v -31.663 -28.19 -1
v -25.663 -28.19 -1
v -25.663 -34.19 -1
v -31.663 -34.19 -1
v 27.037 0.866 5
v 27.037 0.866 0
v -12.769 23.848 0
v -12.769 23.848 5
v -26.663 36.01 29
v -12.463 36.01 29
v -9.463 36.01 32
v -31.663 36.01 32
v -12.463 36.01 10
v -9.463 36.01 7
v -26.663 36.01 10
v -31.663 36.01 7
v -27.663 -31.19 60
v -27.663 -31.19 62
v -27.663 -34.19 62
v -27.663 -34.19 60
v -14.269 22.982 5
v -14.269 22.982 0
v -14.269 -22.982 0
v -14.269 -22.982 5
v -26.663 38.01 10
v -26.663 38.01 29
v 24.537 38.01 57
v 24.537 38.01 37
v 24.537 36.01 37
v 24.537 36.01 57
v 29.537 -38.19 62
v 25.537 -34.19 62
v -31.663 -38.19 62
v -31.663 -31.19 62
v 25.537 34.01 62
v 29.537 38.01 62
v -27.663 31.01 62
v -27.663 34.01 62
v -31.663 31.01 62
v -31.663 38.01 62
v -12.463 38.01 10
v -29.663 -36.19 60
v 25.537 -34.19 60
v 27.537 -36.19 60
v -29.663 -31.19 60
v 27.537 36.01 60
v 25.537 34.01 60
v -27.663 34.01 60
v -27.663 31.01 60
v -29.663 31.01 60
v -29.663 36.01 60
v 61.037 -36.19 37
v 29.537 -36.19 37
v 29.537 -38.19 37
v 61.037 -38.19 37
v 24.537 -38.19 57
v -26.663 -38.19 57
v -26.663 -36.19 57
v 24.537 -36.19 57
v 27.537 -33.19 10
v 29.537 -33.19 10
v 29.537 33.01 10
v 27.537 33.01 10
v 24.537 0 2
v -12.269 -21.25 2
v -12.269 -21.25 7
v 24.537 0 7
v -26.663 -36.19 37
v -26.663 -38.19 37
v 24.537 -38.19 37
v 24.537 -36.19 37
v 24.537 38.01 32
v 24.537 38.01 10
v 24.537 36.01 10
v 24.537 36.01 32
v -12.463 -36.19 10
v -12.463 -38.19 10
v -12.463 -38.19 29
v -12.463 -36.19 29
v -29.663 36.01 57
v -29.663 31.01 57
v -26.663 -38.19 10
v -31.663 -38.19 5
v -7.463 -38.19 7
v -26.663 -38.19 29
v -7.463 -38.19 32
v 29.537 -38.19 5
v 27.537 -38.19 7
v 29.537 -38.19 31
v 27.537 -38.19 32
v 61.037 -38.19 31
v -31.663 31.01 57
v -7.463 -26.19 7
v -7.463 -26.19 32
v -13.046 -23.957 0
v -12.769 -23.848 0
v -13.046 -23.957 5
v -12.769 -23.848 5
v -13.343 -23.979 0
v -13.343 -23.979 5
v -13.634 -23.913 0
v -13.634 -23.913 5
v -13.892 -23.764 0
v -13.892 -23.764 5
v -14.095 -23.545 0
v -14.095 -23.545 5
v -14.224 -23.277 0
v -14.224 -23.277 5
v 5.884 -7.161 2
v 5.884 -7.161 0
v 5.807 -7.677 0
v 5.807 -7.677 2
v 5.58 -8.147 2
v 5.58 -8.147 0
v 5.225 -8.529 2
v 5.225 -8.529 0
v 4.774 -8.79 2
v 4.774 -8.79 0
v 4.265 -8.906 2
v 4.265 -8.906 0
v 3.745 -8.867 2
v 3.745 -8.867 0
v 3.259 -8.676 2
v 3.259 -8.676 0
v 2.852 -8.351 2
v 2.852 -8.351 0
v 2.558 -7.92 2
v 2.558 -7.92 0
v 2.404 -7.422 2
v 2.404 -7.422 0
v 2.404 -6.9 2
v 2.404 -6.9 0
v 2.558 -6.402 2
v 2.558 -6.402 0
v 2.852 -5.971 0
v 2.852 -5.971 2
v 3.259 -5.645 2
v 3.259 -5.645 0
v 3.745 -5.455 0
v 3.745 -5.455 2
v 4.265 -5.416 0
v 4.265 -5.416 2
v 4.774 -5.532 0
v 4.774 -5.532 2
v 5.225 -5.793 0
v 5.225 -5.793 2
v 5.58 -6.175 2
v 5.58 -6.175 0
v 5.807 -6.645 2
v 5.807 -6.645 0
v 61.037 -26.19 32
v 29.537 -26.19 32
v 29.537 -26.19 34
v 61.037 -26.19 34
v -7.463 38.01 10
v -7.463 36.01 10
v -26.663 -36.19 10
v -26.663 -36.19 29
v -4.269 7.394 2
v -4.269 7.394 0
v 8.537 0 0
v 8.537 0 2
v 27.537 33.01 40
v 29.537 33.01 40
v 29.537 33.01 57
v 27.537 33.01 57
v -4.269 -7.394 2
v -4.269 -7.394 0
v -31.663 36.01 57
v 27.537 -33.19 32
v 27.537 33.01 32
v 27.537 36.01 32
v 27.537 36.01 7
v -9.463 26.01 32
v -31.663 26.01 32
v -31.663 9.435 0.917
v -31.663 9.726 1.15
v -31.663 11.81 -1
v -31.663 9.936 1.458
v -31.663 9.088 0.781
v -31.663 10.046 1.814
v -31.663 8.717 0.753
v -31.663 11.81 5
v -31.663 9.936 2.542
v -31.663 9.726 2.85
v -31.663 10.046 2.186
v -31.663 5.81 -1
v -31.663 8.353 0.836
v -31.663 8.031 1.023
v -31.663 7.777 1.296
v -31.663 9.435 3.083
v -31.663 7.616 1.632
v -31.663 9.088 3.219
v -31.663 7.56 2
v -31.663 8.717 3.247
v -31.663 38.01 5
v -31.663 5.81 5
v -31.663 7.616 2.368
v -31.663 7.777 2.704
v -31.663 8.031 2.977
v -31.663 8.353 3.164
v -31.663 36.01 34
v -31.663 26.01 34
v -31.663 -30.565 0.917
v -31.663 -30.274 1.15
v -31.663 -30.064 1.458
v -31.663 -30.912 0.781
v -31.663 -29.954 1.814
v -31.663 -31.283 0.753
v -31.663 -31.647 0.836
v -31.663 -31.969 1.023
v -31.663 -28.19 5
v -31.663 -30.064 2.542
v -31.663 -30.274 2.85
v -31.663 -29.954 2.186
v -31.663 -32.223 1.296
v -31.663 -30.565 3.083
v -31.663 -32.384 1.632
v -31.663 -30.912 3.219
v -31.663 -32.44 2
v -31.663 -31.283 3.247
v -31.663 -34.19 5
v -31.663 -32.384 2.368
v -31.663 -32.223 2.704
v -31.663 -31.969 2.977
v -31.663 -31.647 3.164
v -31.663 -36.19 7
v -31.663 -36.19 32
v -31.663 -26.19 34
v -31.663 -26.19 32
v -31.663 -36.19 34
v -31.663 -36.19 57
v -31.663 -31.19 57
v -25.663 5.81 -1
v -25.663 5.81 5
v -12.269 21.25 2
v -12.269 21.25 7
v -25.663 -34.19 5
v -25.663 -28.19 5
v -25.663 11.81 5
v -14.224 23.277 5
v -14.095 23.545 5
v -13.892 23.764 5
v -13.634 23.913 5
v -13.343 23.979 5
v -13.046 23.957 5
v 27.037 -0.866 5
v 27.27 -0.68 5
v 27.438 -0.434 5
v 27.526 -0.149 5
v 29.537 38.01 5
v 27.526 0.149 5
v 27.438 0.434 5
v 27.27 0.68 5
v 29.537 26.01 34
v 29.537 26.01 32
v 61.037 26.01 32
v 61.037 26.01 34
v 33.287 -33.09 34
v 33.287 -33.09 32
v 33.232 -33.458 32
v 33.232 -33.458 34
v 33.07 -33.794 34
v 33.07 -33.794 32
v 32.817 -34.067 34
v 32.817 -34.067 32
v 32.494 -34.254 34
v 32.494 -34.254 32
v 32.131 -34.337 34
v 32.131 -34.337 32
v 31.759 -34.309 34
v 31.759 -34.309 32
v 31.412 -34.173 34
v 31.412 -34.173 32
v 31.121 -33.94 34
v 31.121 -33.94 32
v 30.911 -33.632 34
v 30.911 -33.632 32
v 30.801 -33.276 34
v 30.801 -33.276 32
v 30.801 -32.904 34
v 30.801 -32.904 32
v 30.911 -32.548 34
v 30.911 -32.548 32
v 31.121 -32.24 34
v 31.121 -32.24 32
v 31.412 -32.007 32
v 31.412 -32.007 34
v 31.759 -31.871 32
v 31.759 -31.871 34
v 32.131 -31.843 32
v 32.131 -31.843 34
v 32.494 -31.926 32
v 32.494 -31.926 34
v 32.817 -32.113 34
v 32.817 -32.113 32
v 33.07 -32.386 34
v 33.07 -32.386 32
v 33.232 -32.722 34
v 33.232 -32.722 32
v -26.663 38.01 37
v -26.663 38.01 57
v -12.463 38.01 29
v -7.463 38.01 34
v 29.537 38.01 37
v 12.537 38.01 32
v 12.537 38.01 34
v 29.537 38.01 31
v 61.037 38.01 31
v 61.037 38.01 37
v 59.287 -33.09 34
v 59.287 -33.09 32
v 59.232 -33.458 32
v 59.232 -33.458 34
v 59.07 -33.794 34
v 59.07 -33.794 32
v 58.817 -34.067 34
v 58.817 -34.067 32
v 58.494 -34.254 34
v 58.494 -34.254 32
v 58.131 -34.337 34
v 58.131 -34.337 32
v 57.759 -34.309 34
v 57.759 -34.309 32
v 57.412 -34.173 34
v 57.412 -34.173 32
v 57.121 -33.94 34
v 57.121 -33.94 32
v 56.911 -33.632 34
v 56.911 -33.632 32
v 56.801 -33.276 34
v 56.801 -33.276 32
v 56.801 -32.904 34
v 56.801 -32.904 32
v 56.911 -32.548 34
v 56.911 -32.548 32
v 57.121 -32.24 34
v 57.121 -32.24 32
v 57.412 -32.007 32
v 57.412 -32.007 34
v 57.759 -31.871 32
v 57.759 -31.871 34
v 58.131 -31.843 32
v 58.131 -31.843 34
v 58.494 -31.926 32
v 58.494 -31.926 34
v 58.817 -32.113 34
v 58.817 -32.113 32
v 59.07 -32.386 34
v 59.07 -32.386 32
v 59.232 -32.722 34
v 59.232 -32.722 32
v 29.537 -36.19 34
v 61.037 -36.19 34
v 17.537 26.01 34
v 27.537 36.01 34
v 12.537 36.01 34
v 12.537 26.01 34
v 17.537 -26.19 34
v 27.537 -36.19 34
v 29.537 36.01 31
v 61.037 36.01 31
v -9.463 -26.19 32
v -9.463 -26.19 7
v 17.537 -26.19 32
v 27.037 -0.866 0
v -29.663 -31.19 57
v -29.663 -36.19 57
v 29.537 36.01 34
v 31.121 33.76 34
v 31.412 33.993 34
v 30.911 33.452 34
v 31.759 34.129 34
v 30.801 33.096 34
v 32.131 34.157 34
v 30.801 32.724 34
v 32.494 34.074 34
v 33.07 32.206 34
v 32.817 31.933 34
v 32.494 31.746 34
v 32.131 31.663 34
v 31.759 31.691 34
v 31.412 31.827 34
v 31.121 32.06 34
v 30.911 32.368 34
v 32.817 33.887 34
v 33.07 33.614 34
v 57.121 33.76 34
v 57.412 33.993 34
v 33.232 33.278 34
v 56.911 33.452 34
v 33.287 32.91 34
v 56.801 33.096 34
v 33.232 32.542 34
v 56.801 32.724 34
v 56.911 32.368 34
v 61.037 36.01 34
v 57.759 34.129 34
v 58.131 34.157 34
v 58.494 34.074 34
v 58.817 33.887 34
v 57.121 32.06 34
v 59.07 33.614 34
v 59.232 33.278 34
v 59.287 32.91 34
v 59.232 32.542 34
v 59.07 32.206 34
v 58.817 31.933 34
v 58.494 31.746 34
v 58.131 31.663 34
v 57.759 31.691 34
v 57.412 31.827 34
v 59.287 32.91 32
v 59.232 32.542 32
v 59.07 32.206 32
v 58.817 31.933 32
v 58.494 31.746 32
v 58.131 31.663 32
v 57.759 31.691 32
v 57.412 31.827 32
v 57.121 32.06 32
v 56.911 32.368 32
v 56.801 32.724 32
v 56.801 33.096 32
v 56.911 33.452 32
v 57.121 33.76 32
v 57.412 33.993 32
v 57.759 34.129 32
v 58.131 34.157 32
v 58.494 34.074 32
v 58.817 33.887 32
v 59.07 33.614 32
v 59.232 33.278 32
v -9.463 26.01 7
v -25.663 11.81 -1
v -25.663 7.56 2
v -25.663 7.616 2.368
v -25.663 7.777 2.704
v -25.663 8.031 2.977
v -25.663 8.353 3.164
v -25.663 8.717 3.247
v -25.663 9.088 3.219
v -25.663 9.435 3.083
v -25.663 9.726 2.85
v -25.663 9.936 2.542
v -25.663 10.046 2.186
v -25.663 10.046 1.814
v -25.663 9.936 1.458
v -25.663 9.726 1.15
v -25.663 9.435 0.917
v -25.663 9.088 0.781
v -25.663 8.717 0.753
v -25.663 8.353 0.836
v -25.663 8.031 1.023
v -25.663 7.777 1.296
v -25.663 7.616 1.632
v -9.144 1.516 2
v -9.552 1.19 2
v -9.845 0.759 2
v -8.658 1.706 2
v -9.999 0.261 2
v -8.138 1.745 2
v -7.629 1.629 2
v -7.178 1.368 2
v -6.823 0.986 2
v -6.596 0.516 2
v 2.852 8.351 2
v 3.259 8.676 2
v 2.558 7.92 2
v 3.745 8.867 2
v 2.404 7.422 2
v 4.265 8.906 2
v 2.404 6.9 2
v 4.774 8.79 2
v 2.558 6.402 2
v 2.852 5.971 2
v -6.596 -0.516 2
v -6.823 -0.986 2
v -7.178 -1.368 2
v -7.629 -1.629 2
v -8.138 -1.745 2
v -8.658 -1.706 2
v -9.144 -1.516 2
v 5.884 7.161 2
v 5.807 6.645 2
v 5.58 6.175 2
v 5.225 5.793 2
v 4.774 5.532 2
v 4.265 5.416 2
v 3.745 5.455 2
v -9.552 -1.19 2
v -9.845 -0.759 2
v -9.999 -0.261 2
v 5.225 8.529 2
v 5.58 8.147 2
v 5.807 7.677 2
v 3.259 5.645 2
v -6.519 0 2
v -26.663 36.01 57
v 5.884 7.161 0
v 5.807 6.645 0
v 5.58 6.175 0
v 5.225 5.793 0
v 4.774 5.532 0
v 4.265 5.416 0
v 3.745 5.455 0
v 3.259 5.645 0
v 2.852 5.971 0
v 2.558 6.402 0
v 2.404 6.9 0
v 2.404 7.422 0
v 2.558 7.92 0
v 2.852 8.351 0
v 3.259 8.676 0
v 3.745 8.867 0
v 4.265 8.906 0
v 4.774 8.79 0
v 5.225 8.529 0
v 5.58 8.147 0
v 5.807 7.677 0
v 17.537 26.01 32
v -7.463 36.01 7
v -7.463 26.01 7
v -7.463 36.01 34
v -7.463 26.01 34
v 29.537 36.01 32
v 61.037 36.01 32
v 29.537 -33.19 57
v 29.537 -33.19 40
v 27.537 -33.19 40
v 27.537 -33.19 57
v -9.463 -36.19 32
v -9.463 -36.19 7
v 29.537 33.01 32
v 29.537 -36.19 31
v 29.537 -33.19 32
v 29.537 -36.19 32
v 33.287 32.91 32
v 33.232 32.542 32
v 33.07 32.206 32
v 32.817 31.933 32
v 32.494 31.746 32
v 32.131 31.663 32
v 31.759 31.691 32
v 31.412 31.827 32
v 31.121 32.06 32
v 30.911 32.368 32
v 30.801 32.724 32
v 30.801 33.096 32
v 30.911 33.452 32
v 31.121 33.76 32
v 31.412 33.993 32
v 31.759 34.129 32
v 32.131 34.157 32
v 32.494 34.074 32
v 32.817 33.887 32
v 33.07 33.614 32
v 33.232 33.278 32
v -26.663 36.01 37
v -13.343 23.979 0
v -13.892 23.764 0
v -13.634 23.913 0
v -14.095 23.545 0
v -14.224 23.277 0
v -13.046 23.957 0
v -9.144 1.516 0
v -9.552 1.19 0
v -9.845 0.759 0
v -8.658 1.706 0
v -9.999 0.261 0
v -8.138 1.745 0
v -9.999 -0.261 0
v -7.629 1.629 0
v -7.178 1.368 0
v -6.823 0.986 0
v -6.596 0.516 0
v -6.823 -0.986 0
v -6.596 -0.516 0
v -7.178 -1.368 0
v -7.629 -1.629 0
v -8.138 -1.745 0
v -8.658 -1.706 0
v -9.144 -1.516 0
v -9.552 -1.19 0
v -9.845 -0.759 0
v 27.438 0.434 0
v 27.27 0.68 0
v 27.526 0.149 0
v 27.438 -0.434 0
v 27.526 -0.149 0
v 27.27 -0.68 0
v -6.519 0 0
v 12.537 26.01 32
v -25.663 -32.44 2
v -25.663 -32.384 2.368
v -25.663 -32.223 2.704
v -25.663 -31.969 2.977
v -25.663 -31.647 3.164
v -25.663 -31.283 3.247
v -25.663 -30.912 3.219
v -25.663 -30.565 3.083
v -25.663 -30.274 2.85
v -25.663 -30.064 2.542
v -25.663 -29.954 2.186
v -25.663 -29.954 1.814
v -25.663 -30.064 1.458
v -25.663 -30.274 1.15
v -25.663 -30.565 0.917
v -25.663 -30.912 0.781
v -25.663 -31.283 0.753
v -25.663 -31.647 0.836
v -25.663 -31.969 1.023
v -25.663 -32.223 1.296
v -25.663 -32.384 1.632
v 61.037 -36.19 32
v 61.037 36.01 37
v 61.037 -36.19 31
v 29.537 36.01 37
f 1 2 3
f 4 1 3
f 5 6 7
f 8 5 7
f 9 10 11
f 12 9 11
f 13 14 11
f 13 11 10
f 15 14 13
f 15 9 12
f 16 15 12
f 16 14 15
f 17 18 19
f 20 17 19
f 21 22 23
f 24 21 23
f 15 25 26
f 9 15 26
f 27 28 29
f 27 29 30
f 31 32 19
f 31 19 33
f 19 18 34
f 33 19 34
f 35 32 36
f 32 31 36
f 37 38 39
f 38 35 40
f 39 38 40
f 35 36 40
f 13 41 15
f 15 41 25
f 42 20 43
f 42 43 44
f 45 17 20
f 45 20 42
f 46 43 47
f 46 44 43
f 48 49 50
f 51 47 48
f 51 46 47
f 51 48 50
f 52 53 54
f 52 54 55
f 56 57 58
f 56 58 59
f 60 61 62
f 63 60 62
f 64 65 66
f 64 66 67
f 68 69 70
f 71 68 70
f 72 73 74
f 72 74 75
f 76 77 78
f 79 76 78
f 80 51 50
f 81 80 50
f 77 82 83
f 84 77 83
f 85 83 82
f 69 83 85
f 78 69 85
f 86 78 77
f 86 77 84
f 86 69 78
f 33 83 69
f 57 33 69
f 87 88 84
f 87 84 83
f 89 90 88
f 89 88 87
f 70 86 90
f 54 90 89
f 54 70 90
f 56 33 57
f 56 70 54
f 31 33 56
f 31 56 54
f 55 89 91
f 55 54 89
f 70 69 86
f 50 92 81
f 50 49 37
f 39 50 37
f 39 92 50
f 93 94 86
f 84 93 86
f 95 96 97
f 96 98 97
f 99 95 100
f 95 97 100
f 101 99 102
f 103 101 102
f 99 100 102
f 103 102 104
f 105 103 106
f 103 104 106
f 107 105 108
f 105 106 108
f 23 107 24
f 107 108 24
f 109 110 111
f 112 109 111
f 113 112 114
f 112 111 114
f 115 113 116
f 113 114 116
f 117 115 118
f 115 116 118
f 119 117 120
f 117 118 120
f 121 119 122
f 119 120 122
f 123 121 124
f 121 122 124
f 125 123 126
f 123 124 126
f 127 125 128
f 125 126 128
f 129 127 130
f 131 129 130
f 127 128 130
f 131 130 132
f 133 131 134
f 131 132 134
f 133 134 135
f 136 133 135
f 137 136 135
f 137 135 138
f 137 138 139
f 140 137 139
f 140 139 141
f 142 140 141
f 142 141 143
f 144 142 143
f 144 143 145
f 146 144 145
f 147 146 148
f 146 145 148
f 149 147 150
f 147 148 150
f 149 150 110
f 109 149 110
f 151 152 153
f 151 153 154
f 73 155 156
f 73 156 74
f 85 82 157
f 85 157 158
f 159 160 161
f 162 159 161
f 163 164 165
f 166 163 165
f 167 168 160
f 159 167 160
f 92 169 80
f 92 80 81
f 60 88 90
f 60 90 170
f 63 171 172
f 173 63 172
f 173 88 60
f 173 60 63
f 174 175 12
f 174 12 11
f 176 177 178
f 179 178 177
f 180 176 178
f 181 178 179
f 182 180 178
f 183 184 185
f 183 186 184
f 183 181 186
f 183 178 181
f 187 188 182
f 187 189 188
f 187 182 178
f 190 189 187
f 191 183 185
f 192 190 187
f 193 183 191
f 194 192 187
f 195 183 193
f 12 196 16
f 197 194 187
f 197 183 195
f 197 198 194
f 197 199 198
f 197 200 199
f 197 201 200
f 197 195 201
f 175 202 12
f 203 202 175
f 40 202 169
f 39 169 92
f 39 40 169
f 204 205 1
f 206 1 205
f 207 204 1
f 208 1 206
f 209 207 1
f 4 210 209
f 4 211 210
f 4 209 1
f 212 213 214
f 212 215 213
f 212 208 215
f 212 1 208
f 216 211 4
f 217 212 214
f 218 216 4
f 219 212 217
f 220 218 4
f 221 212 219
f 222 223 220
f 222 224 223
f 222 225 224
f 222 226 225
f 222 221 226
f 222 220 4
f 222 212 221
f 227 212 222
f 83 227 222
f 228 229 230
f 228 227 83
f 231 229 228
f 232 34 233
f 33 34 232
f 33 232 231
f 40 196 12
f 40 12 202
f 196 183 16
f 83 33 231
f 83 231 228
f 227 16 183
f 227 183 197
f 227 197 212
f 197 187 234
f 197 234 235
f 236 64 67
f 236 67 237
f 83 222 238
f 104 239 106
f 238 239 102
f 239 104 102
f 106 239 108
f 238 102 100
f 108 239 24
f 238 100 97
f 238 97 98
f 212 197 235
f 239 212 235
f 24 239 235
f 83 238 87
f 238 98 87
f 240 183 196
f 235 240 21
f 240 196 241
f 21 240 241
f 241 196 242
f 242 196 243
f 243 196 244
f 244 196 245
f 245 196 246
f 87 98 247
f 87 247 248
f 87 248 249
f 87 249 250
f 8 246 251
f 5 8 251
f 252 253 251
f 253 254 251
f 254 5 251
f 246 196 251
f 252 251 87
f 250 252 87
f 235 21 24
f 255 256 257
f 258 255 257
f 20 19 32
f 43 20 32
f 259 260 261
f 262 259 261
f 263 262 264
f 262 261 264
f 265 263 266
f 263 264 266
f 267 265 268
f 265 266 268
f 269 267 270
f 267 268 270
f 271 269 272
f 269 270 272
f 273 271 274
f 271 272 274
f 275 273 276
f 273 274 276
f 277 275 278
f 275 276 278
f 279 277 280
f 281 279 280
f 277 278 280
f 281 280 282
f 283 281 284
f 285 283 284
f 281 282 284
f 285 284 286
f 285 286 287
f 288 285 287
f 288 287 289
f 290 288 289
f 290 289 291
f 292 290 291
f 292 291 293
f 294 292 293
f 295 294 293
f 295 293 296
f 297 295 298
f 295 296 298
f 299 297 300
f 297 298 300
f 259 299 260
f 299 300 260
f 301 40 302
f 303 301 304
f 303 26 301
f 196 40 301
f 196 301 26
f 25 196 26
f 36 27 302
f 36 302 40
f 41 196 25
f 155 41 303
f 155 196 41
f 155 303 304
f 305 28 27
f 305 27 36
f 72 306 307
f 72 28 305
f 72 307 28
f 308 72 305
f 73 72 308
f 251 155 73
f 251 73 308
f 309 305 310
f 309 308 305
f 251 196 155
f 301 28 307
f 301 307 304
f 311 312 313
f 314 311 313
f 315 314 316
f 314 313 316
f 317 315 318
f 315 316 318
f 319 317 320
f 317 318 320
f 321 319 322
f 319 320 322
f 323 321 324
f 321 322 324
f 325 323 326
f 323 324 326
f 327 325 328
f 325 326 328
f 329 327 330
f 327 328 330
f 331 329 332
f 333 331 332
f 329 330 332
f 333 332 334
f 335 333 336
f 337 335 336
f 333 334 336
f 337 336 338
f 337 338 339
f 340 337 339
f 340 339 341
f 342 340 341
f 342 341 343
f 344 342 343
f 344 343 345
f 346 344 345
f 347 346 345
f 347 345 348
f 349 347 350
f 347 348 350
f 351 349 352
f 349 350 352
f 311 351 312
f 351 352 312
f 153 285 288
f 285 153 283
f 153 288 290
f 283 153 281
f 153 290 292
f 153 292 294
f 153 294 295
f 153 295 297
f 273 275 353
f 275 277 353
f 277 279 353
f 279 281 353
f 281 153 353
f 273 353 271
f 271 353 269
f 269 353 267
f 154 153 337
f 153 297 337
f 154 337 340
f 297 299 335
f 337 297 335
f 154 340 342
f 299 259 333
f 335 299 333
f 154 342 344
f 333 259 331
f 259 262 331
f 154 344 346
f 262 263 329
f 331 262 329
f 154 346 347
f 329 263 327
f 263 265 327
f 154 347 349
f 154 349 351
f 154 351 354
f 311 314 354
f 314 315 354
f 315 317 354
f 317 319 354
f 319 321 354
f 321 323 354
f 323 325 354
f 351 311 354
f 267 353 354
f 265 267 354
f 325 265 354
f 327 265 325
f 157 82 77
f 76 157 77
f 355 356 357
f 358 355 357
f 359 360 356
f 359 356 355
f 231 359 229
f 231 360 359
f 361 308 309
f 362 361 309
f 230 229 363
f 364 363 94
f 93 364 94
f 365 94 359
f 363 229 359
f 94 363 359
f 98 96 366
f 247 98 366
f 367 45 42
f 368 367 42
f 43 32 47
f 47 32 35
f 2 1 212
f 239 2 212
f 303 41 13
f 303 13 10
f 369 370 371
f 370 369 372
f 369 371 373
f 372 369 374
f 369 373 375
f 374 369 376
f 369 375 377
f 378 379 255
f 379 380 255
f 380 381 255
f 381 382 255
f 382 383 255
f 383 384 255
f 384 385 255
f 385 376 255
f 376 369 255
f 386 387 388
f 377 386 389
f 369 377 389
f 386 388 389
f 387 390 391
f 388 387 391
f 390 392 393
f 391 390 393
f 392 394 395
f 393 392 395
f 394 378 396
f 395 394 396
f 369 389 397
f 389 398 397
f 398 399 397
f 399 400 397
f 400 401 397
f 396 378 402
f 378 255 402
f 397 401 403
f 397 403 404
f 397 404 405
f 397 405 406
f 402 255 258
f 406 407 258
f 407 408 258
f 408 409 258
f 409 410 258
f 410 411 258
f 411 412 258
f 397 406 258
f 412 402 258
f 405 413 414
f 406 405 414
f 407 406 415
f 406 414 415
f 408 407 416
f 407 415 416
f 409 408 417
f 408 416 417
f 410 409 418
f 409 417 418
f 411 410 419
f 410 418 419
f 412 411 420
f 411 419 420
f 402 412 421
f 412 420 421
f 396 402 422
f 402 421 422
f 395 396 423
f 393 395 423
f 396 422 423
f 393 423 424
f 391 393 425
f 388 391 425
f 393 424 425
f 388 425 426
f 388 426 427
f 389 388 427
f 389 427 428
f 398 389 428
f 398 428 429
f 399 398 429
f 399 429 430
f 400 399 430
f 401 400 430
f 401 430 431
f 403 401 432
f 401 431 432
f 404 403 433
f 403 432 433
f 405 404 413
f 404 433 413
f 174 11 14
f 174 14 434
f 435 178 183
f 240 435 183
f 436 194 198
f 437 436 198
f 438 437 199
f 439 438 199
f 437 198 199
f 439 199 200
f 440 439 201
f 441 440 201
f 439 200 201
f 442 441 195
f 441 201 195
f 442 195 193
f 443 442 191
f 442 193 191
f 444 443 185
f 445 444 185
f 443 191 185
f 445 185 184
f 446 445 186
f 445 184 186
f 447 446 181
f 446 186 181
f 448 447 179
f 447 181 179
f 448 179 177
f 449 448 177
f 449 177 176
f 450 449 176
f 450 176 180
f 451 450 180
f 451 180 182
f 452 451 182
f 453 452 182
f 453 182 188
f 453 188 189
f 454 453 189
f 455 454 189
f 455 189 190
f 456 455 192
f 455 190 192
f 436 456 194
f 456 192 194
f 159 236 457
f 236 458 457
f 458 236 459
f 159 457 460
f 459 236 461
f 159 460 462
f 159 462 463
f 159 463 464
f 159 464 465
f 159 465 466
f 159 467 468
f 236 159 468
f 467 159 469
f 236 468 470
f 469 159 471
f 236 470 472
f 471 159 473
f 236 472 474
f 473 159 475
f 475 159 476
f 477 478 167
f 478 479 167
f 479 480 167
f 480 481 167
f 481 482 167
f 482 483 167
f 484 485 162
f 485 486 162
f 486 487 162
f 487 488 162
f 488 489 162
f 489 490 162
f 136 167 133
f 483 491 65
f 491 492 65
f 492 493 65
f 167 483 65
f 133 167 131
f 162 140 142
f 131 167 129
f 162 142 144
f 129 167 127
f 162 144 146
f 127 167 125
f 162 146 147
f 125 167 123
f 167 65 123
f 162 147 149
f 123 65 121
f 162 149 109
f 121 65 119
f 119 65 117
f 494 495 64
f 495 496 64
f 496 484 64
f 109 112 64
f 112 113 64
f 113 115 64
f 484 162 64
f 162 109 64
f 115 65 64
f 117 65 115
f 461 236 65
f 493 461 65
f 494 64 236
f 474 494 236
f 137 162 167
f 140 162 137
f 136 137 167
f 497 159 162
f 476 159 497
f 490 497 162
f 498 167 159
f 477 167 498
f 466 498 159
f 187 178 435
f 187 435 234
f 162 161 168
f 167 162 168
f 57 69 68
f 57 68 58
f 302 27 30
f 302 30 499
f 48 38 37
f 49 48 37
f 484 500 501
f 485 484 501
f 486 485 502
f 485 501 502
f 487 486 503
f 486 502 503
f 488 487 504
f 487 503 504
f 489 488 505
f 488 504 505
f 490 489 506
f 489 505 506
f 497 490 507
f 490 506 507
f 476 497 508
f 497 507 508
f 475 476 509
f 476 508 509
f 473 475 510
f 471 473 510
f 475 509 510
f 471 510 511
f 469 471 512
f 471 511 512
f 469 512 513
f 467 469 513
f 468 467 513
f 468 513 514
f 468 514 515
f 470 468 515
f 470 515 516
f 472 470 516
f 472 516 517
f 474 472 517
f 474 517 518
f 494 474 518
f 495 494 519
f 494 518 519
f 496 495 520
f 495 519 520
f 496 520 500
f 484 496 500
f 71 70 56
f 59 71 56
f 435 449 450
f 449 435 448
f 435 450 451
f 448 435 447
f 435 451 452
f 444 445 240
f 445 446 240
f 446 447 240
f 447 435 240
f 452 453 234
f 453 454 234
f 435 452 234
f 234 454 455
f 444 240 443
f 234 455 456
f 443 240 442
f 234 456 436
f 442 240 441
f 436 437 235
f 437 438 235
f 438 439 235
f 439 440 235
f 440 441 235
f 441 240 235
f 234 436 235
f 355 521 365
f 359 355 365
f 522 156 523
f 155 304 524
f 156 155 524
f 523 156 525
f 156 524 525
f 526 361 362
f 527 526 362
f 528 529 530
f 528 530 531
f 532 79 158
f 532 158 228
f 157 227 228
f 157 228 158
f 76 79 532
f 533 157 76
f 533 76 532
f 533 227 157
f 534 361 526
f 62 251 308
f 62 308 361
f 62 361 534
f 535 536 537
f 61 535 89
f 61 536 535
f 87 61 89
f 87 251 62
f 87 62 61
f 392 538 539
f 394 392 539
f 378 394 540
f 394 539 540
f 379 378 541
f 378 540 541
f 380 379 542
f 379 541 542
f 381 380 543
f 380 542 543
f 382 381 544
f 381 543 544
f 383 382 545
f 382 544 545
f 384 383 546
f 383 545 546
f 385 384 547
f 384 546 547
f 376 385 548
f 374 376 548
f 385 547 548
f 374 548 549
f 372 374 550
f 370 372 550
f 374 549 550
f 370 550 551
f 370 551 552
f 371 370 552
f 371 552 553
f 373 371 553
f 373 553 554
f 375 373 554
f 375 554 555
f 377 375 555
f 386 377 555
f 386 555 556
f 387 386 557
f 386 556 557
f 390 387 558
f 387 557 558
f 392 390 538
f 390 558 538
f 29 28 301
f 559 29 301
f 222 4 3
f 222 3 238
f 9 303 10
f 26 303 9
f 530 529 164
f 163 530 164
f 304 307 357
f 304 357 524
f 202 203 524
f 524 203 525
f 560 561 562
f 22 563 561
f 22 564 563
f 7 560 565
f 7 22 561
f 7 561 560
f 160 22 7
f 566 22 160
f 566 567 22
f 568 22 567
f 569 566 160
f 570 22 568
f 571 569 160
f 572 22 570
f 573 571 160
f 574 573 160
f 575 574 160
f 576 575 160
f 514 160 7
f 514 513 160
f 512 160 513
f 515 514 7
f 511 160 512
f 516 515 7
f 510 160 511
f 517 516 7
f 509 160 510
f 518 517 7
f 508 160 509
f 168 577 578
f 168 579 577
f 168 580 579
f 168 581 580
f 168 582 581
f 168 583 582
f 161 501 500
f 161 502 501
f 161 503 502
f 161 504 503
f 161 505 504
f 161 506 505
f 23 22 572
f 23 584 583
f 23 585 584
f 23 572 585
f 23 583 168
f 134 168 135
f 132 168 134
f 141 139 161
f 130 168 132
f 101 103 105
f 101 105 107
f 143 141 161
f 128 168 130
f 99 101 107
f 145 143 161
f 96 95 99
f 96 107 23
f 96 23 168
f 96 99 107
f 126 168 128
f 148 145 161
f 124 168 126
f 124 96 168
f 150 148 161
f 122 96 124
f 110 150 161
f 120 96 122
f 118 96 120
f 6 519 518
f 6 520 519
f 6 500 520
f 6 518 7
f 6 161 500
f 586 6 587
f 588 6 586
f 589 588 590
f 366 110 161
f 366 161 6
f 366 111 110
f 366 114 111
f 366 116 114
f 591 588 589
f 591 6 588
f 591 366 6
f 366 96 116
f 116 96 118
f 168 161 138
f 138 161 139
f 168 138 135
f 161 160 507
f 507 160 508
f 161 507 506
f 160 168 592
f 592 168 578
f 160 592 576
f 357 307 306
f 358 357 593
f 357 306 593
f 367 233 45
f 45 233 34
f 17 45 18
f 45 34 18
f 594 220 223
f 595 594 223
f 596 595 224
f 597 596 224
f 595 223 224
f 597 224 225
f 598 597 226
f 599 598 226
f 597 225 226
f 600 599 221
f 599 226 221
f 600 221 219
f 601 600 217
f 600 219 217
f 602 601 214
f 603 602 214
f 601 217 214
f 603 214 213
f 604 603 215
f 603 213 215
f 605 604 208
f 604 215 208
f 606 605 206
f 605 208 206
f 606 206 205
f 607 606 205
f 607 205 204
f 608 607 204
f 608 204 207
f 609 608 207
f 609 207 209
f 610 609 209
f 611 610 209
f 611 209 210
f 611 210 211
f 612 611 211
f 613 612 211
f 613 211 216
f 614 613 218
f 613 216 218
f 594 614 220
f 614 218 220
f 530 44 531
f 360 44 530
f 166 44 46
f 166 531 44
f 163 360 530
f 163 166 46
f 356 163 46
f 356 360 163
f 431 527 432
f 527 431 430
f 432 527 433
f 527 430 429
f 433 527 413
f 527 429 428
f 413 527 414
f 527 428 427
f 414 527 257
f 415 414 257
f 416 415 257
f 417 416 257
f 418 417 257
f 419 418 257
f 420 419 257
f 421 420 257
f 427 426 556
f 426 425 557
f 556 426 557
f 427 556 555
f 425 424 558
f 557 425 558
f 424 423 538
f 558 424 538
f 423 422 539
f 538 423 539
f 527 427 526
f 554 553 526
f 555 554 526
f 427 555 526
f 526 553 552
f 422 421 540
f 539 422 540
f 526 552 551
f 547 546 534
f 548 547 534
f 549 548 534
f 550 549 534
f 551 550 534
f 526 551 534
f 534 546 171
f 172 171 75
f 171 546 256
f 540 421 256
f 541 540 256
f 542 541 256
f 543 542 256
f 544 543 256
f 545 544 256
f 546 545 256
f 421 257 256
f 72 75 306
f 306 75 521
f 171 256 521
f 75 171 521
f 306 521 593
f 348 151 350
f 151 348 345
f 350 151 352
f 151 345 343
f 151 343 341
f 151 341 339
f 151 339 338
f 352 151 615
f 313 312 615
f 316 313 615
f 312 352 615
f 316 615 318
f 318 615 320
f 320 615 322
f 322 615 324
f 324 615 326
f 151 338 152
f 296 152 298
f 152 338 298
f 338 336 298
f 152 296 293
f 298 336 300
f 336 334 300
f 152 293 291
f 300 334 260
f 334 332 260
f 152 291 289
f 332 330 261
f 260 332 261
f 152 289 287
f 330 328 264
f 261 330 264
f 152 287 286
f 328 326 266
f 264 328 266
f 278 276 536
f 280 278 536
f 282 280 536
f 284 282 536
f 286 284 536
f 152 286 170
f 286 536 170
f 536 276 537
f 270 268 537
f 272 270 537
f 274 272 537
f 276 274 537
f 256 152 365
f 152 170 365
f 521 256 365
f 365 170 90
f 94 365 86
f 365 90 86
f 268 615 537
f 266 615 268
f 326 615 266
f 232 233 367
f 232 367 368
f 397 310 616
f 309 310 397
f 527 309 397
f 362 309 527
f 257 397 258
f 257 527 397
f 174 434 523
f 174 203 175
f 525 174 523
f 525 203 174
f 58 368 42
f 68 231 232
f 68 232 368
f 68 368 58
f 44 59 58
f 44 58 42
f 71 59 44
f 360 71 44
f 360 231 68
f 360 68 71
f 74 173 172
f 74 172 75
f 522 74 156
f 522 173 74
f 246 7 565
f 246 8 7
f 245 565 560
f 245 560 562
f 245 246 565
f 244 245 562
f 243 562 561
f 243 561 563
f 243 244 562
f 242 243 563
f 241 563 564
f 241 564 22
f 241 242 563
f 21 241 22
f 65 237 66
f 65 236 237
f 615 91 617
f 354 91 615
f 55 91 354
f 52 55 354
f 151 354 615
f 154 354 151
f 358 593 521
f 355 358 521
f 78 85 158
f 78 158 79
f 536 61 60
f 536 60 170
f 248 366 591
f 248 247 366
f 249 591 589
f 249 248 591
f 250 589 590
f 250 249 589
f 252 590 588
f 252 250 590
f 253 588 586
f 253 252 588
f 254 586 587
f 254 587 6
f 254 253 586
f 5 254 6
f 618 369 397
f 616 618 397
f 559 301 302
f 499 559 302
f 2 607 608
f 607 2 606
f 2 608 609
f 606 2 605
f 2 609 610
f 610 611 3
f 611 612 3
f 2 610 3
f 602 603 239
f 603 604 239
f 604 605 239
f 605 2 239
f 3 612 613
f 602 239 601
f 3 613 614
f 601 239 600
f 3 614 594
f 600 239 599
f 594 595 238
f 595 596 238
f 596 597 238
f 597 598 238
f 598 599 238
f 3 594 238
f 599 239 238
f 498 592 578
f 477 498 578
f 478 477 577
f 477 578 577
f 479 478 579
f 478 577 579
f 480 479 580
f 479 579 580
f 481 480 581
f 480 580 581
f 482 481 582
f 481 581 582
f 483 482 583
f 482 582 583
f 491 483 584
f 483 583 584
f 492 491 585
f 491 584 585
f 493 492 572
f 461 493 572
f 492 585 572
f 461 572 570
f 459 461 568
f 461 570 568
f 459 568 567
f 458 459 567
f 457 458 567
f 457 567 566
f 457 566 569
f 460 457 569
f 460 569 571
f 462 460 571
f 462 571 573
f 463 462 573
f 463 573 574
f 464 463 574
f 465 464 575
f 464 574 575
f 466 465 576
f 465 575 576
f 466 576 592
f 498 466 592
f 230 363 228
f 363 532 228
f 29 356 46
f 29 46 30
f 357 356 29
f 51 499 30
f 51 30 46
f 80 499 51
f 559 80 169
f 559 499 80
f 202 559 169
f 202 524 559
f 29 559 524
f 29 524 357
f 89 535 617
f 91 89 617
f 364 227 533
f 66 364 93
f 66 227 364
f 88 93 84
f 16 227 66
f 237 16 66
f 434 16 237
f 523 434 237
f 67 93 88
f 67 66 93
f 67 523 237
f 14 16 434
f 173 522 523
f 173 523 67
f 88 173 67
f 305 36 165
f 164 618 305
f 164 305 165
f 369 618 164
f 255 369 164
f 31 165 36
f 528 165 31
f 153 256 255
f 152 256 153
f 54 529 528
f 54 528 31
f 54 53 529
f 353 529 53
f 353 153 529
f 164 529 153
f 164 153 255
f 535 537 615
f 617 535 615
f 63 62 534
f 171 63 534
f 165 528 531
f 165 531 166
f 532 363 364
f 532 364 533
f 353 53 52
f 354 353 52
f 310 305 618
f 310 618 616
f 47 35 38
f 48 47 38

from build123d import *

# Parameters (mm, degrees)
PAD_DEPTH       = 5
FILLET_R        = 1
FILLET001_R     = 1
FILLET002_R     = 1
SKETCH001_R     = 1.75
PAD001_DEPTH    = 2
SKETCH002_W     = 61.2
SKETCH002_H     = 76.2
PAD002_DEPTH    = 2
PAD003_DEPTH    = 55
SKETCH004_W     = 35
SKETCH004_H     = 25
SKETCH004_W_2   = 14.2
SKETCH004_H_2   = 19
SKETCH004_W_3   = 51.2
SKETCH004_H_3   = 20
POCKET_DEPTH    = 2
SKETCH005_W     = 14.2
SKETCH005_H     = 19
SKETCH005_W_2   = 51.2
SKETCH005_H_2   = 20
POCKET001_DEPTH = 2
SKETCH006_W     = 66.2
SKETCH006_H     = 22
SKETCH006_H_2   = 17
POCKET002_DEPTH = 2
SKETCH007_W     = 24.2
SKETCH007_H     = 10
SKETCH007_W_2   = 31.5
SKETCH007_H_2   = 12
SKETCH007_R     = 1.25
PAD004_DEPTH    = 2
SKETCH008_W     = 31.5
SKETCH008_H     = 2
PAD005_DEPTH    = 3
PAD006_DEPTH    = 2
SKETCH010_W     = 5
SKETCH010_H     = 3
PAD007_DEPTH    = 2
SKETCH011_W     = 6
SKETCH011_H     = 6
SKETCH011_R     = 1.25
PAD008_DEPTH    = 6
SKETCH012_W     = 2
SKETCH012_H     = 10
PAD009_DEPTH    = 25


with BuildPart() as part:
    # Sketch → Pad (new body)
    with BuildSketch(Plane.XY):
        Polygon((28.537386, 0), (-14.268693, 24.714102), (-14.268693, -24.714102), align=None)
        Polygon((24.537386, 0), (-12.268693, 21.25), (-12.268693, -21.25), align=None, mode=Mode.SUBTRACT)
    extrude(amount=PAD_DEPTH)

    # Fillet
    fillet_edges = [part.edges().sort_by_distance(p)[0] for p in [
        (-14.268693, -24.714102, 2.5),
    ]]
    fillet(fillet_edges, radius=FILLET_R)

    # Fillet001
    fillet001_edges = [part.edges().sort_by_distance(p)[0] for p in [
        (28.537386, 0, 2.5),
    ]]
    fillet(fillet001_edges, radius=FILLET001_R)

    # Fillet002
    fillet002_edges = [part.edges().sort_by_distance(p)[0] for p in [
        (-14.268693, 24.714102, 2.5),
    ]]
    fillet(fillet002_edges, radius=FILLET002_R)

    # Sketch001 (on Face1 of Fillet002) → Pad001 (join)
    with BuildSketch(Plane(origin=(0, 0, 0), x_dir=(1, 0, 0), z_dir=(0, 0, -1))):
        Polygon((24.537386, 0), (-12.268693, 21.25), (-12.268693, -21.25), align=None)
        with Locations((4.134347, 7.160898)):
            Circle(SKETCH001_R, mode=Mode.SUBTRACT)
        with Locations((4.134347, -7.160898)):
            Circle(SKETCH001_R, mode=Mode.SUBTRACT)
        with Locations((-8.268693, 0)):
            Circle(SKETCH001_R, mode=Mode.SUBTRACT)
        Polygon((8.537386, 0), (-4.268693, 7.393594), (-4.268693, -7.393594), align=None, mode=Mode.SUBTRACT)
    extrude(amount=-PAD001_DEPTH)

    # Sketch002 (on Face9 of Pad001) → Pad002 (join)
    with BuildSketch(Plane.XY.offset(5)):
        with Locations((-1.062614, -0.09)):
            Rectangle(SKETCH002_W, SKETCH002_H)
        Polygon((-12.268693, 21.25), (-12.268693, -21.25), (24.537386, 0), align=None, mode=Mode.SUBTRACT)
    extrude(amount=PAD002_DEPTH)

    # Sketch003 (on Face21 of Pad002) → Pad003 (join)
    with BuildSketch(Plane.XY.offset(7)):
        Polygon((-31.662614, 38.01), (29.537386, 38.01), (29.537386, -38.19), (-31.662614, -38.19), (-31.662614, -36.19), (27.537386, -36.19), (27.537386, 36.01), (-31.662614, 36.01), align=None)
    extrude(amount=PAD003_DEPTH)

    # Sketch004 (on Face26 of Pad003) → Pocket (cut)
    with BuildSketch(Plane.XZ.offset(38.19)):
        with Locations((10.037386, 19.5)):
            Rectangle(SKETCH004_W, SKETCH004_H)
        with Locations((-19.562614, 19.5)):
            Rectangle(SKETCH004_W_2, SKETCH004_H_2)
        with Locations((-1.062614, 47)):
            Rectangle(SKETCH004_W_3, SKETCH004_H_3)
    extrude(amount=-POCKET_DEPTH, mode=Mode.SUBTRACT)

    # Sketch005 (on Face21 of Pocket) → Pocket001 (cut)
    with BuildSketch(Plane(origin=(0, 38.01, 0), x_dir=(-1, 0, 0), z_dir=(0, 1, 0))):
        Polygon((-24.537386, 32), (-12.537386, 32), (-12.537386, 34), (7.462614, 34), (7.462614, 32), (7.462614, 10), (-24.537386, 10), align=None)
        with Locations((19.562614, 19.5)):
            Rectangle(SKETCH005_W, SKETCH005_H)
        with Locations((1.062614, 47)):
            Rectangle(SKETCH005_W_2, SKETCH005_H_2)
    extrude(amount=-POCKET001_DEPTH, mode=Mode.SUBTRACT)

    # Sketch006 (on Face25 of Pocket001) → Pocket002 (cut)
    with BuildSketch(Plane.YZ.offset(29.537386)):
        with Locations((-0.09, 21)):
            Rectangle(SKETCH006_W, SKETCH006_H)
        with Locations((-0.09, 48.5)):
            Rectangle(SKETCH006_W, SKETCH006_H_2)
    extrude(amount=-POCKET002_DEPTH, mode=Mode.SUBTRACT)

    # Sketch007 (on Face62 of Pocket002) → Pad004 (join)
    with BuildSketch(Plane(origin=(0, 0, 32), x_dir=(1, 0, 0), z_dir=(0, 0, -1))):
        Polygon((-31.662614, 36.19), (27.537386, 36.19), (27.537386, -36.01), (12.537386, -36.01), (12.537386, -26.01), (17.537386, -26.01), (17.537386, 26.19), (-31.662614, 26.19), align=None)
        with Locations((-19.562614, -31.01)):
            Rectangle(SKETCH007_W, SKETCH007_H)
        with Locations((45.287386, -32.01)):
            Rectangle(SKETCH007_W_2, SKETCH007_H_2)
        with Locations((58.037386, -32.91)):
            Circle(SKETCH007_R, mode=Mode.SUBTRACT)
        with Locations((32.037386, -32.91)):
            Circle(SKETCH007_R, mode=Mode.SUBTRACT)
        with Locations((45.287386, 32.19)):
            Rectangle(SKETCH007_W_2, SKETCH007_H_2)
        with Locations((32.037386, 33.09)):
            Circle(SKETCH007_R, mode=Mode.SUBTRACT)
        with Locations((58.037386, 33.09)):
            Circle(SKETCH007_R, mode=Mode.SUBTRACT)
    extrude(amount=-PAD004_DEPTH)

    # Sketch008 (on Face78 of Pad004) → Pad005 (join, symmetric)
    with BuildSketch(Plane.XY.offset(34)):
        with Locations((45.287386, 37.01)):
            Rectangle(SKETCH008_W, SKETCH008_H)
        with Locations((45.287386, -37.19)):
            Rectangle(SKETCH008_W, SKETCH008_H)
    extrude(amount=PAD005_DEPTH, both=True)

    # Sketch009 (on Face31 of Pad005) → Pad006 (join)
    with BuildSketch(Plane.XY.offset(62)):
        Polygon((-31.662614, 36.01), (27.537386, 36.01), (27.537386, -36.19), (-31.662614, -36.19), (-31.662614, -34.19), (-31.662614, -31.19), (-27.662614, -31.19), (-27.662614, -34.19), (25.537386, -34.19), (25.537386, 34.01), (-27.662614, 34.01), (-27.662614, 31.01), (-31.662614, 31.01), (-31.662614, 34.01), align=None)
    extrude(amount=-PAD006_DEPTH)

    # Sketch010 (on Face24 of Pad006) → Pad007 (join)
    with BuildSketch(Plane(origin=(-31.662614, 0, 0), x_dir=(0, -1, 0), z_dir=(-1, 0, 0))):
        with Locations((-33.51, 58.5)):
            Rectangle(SKETCH010_W, SKETCH010_H)
        with Locations((33.69, 58.5)):
            Rectangle(SKETCH010_W, SKETCH010_H)
    extrude(amount=-PAD007_DEPTH)

    # Sketch011 (on Face17 of Pad007) → Pad008 (join)
    with BuildSketch(Plane(origin=(-31.662614, 0, 0), x_dir=(0, -1, 0), z_dir=(-1, 0, 0))):
        with Locations((31.19, 2)):
            Rectangle(SKETCH011_W, SKETCH011_H)
        with Locations((31.19, 2)):
            Circle(SKETCH011_R, mode=Mode.SUBTRACT)
        with Locations((-8.81, 2)):
            Rectangle(SKETCH011_W, SKETCH011_H)
        with Locations((-8.81, 2)):
            Circle(SKETCH011_R, mode=Mode.SUBTRACT)
    extrude(amount=-PAD008_DEPTH)

    # Sketch012 (on Face119 of Pad008) → Pad009 (join)
    with BuildSketch(Plane(origin=(0, 0, 32), x_dir=(1, 0, 0), z_dir=(0, 0, -1))):
        with Locations((-8.462614, 31.19)):
            Rectangle(SKETCH012_W, SKETCH012_H)
        with Locations((-8.462614, -31.01)):
            Rectangle(SKETCH012_W, SKETCH012_H)
    extrude(amount=PAD009_DEPTH)


solid = part.part
